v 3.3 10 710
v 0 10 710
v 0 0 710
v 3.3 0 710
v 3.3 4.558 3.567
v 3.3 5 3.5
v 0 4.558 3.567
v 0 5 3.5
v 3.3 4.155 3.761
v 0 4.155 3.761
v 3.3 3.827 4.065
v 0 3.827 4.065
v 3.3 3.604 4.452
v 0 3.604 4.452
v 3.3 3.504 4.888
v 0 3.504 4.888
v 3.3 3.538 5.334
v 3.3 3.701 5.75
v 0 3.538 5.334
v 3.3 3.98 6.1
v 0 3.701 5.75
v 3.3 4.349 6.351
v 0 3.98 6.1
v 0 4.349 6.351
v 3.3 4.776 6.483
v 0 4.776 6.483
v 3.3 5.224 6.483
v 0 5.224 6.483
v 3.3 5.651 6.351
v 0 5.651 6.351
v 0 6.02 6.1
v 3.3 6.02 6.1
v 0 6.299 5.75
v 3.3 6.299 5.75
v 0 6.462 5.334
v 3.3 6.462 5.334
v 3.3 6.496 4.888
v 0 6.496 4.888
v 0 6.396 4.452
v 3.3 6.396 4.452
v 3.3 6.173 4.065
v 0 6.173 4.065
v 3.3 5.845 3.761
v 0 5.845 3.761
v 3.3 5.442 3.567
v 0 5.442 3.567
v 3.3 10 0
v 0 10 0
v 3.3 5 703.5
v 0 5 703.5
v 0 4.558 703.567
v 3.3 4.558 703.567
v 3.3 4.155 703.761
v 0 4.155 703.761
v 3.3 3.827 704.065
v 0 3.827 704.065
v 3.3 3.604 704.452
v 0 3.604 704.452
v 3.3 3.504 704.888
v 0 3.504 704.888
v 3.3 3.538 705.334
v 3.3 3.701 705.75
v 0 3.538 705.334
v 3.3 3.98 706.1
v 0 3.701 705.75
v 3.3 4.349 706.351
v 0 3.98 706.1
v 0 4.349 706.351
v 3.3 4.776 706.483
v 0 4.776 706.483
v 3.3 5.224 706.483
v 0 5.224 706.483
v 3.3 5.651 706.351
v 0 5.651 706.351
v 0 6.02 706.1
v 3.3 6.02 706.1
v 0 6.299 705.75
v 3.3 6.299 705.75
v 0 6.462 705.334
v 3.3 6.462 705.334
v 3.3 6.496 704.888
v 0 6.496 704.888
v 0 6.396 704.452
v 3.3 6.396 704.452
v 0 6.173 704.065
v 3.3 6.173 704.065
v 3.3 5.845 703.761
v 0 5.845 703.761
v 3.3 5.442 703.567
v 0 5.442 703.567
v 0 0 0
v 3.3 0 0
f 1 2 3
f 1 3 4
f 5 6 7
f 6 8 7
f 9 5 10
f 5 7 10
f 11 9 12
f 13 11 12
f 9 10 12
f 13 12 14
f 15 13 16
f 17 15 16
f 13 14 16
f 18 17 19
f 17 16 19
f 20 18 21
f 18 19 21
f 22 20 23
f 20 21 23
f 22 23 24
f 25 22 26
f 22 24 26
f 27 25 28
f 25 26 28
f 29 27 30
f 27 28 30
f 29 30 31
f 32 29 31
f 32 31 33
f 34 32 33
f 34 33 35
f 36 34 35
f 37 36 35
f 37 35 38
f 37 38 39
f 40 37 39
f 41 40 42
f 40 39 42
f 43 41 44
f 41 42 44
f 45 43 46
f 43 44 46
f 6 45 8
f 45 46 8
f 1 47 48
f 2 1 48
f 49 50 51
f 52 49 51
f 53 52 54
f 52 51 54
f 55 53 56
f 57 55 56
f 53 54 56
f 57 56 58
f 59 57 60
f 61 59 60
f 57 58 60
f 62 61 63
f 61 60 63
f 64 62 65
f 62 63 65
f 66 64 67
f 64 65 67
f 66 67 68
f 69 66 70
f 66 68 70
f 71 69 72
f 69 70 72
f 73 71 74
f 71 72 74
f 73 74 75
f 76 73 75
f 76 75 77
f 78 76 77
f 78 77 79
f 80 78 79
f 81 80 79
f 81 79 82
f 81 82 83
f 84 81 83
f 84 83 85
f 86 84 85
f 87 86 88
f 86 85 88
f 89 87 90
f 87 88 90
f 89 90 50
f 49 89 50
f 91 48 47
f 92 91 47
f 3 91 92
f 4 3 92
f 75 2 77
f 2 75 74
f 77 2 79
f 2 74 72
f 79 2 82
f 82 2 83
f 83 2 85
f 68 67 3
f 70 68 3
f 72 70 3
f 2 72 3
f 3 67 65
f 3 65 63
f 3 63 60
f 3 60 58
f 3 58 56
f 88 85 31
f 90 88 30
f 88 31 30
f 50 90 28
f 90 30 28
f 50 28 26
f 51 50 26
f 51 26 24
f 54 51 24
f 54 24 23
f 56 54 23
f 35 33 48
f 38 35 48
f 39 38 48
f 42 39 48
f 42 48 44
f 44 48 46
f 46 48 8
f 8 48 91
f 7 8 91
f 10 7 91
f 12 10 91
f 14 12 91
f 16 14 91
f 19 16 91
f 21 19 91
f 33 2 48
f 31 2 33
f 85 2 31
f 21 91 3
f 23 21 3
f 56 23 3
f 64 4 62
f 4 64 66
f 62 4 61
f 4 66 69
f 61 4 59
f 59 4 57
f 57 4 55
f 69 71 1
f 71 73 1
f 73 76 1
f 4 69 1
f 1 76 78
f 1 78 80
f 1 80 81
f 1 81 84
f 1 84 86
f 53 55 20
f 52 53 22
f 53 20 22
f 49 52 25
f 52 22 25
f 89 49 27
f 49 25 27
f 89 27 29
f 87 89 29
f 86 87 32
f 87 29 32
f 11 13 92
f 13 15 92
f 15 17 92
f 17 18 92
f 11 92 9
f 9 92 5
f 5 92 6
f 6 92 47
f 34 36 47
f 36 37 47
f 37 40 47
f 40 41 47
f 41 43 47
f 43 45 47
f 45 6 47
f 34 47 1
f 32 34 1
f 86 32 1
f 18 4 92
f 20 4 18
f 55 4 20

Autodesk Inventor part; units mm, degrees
ref_plane "YZ Plane" through (0, 0, 0) normal (1, 0, 0) x (0, 1, 0)
ref_plane "XZ Plane" through (0, 0, 0) normal (0, 1, 0) x (-1, 0, 0)
ref_plane "XY Plane" through (0, 0, 0) normal (0, 0, 1) x (1, 0, 0)
sketch "スケッチ1" plane through (0, 0, 0) normal (0, 0, 1) x (1, 0, 0)
  line L0 (0, 0) -> (3.3, 0)
  line L1 (3.3, 0) -> (3.3, 10)
  line L2 (3.3, 10) -> (0, 10)
  line L3 (0, 10) -> (0, 0)
  dimension "d0" = 3.3
  dimension "d1" = 10
extrude "押し出し1" add sketch "スケッチ1" along normal blind 710
sketch "スケッチ2" plane through (3.3, 10, 710) normal (1, 0, 0) x (0, 0, -1)
  line L0 (710, -10) -> (710, 0) projected
  line L1 (710, 0) -> (0, 0) projected
  line L2 (0, -10) -> (0, 0) projected
  point P0 (705, -5)
  point P1 (5, -5)
  dimension "d4" = 5
  dimension "d5" = 5
  dimension "d6" = 5
  dimension "d7" = 5
hole "穴1" at (3.3, 5, 5) at (3.3, 5, 705) direction (-1, 0, 0) diameter 3 end through all
properties part number "DR成形フレキラックDR1-2000KHK" material "ABS プラスチック"
